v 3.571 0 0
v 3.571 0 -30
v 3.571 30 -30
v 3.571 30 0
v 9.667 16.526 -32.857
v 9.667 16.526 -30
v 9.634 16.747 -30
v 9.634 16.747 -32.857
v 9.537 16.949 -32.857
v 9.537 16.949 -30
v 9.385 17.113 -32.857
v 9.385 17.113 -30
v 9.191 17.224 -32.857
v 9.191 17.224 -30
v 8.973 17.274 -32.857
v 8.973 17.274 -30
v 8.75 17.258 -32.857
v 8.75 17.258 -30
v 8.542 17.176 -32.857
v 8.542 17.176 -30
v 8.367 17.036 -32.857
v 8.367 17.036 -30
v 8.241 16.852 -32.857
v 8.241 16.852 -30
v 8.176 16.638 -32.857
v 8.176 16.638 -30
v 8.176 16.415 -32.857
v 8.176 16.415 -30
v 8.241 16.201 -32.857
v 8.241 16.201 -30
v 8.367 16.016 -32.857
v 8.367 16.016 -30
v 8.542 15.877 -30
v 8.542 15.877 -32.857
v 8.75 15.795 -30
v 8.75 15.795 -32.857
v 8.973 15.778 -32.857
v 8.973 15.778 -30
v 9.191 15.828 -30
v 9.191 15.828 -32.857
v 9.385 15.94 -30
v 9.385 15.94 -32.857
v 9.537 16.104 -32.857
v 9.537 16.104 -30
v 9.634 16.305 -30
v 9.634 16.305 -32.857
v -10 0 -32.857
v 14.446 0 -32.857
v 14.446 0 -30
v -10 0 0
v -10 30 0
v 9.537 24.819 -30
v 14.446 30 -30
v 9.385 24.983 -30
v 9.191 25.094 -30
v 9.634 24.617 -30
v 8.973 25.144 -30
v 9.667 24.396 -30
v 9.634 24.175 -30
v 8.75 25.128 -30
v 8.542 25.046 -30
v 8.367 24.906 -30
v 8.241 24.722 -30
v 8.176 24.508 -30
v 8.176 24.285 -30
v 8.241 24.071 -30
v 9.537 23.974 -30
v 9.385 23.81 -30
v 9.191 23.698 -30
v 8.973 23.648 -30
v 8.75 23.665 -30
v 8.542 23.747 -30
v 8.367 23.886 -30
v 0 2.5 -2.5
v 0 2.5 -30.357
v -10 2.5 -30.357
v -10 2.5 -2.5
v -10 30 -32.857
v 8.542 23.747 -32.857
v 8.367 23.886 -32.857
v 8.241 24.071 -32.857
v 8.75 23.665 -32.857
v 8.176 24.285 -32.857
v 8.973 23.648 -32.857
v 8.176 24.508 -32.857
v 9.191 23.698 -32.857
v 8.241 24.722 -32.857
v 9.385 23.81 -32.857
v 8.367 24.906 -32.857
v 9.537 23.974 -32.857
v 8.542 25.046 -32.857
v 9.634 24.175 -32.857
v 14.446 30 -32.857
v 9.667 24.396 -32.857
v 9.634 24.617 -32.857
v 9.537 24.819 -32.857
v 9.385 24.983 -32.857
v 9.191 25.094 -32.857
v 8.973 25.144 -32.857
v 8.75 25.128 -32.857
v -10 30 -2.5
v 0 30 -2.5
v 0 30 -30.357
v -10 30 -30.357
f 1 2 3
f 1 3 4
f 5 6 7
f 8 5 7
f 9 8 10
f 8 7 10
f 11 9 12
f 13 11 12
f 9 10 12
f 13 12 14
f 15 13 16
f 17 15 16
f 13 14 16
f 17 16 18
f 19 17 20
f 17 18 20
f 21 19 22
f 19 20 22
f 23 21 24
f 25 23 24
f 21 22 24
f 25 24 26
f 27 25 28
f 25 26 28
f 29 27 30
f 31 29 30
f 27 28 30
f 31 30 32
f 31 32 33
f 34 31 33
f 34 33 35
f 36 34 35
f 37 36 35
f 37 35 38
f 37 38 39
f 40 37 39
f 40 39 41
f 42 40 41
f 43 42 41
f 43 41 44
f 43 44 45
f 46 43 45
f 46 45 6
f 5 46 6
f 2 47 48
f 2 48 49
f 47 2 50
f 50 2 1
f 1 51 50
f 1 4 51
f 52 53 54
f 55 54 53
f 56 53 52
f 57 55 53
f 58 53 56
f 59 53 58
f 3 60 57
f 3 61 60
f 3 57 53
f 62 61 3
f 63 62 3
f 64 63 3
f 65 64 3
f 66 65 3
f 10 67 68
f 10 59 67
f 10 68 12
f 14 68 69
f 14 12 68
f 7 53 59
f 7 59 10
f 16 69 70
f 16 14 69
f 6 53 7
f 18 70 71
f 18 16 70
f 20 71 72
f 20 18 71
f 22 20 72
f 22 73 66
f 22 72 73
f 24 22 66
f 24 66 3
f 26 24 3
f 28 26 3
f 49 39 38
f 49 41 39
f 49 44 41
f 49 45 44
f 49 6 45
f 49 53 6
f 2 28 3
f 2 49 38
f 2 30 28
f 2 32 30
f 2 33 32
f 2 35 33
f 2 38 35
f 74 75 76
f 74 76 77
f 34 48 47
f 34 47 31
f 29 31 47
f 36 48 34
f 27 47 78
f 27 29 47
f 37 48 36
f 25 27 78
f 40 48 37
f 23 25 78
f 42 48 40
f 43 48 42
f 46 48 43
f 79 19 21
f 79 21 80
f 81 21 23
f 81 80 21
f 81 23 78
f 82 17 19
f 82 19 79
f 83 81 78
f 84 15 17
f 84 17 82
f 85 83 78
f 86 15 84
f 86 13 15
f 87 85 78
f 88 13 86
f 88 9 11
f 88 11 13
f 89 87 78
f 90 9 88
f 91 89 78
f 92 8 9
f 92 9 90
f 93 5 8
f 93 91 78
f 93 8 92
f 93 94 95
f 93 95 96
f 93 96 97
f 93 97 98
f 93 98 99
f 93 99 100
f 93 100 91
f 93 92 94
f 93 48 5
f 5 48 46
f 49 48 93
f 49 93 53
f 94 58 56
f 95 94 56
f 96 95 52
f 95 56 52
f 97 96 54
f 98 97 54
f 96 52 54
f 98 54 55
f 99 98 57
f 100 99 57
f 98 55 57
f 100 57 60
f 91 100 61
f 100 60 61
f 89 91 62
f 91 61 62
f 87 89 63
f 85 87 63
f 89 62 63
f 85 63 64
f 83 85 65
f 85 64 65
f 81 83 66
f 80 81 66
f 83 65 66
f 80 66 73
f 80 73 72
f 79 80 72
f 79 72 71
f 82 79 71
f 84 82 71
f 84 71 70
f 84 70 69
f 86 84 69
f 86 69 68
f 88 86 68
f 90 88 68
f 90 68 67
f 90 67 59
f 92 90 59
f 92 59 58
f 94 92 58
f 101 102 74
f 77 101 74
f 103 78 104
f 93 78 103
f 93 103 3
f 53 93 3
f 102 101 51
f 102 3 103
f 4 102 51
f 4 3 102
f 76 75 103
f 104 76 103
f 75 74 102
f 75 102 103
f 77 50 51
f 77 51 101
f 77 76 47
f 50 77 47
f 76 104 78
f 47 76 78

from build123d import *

# Parameters (mm, degrees)
BOSS_EXTRUDE1_DEPTH = 30
BOSS_EXTRUDE3_DEPTH = 10
SKETCH4_R           = 0.75
CUT_EXTRUDE1_DEPTH  = 10


with BuildPart() as part:
    # Sketch1 → Boss-Extrude1 (new body)
    with BuildSketch(Plane(origin=(0, 0, 0), x_dir=(1, 0, 0), z_dir=(0, 1, 0))):
        Polygon((0, 0), (0, 32.857142857), (14.446341209, 32.857142857), (14.446341209, 30), (3.571428571, 30), (3.571428571, 0), align=None)
    extrude(amount=BOSS_EXTRUDE1_DEPTH)

    # Sketch3 → Boss-Extrude3 (add)
    with BuildSketch(Plane.ZY):
        Polygon((-30.357142857, 0), (-32.857142857, 0), (-32.857142857, 30), (-30.357142857, 30), (-30.357142857, 27.5), (-30.357142857, 2.5), (-2.5, 2.5), (-2.5, 27.5), (-2.5, 30), (0, 30), (0, 0), (-2.5, 0), align=None)
    extrude(amount=BOSS_EXTRUDE3_DEPTH)

    # Sketch4 → Cut-Extrude1 (cut)
    with BuildSketch(Plane.XY.offset(-30)):
        with Locations((8.91712718, 24.396309317)):
            Circle(SKETCH4_R)
        with Locations((8.91712718, 16.526309317)):
            Circle(SKETCH4_R)
    extrude(amount=-CUT_EXTRUDE1_DEPTH, mode=Mode.SUBTRACT)


solid = part.part
